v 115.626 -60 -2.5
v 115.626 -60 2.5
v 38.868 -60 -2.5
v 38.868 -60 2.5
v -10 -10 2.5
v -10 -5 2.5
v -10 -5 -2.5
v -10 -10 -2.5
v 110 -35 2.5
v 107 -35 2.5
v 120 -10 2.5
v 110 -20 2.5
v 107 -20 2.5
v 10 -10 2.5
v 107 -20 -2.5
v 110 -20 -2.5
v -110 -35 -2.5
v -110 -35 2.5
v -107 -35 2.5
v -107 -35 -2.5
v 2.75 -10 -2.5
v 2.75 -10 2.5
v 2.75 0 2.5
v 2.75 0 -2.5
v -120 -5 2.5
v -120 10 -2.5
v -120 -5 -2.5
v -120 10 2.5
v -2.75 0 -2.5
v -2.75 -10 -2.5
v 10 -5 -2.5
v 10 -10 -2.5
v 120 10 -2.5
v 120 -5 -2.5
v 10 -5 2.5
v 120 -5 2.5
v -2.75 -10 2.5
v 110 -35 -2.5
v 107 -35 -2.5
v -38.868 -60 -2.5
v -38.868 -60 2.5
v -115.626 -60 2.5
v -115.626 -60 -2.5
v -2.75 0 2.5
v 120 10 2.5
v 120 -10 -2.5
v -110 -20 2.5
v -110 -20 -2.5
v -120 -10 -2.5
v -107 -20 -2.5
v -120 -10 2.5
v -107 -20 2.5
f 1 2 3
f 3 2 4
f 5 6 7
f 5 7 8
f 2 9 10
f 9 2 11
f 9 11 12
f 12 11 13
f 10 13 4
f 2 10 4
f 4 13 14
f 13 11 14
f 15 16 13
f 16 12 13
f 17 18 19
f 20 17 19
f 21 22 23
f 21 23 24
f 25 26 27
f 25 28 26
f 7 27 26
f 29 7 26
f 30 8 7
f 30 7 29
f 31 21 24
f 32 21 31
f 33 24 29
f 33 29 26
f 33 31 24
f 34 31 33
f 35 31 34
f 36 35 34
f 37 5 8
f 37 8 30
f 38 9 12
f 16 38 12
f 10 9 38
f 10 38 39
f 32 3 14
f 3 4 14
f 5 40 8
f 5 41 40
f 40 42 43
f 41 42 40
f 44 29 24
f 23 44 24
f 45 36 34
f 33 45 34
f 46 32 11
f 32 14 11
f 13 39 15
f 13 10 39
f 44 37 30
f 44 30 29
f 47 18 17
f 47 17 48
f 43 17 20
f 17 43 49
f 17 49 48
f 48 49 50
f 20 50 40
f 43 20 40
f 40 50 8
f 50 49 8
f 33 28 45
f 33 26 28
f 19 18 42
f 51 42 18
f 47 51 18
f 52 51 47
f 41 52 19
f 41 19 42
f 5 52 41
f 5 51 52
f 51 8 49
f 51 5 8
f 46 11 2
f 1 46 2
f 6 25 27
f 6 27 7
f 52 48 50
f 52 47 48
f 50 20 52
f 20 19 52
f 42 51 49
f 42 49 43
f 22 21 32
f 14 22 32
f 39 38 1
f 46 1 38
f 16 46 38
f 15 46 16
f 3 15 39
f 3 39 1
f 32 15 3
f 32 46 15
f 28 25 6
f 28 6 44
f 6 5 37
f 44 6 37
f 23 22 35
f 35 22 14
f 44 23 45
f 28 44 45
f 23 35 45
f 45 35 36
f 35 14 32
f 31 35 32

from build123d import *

# Parameters (mm, degrees)
SKETCH1_W             = 3
SKETCH1_H             = 15
BOSS_EXTRUDE2_DEPTH   = 2.5
BOSS_EXTRUDE2_2_DEPTH = 2.5
MIRROR1_START         = -5
MIRROR1_OUTLINE_W     = 117.25
MIRROR1_OUTLINE_H     = 5
MIRROR1_DEPTH         = 15
MIRROR1_START_2       = -10
MIRROR1_2_OUTLINE_W   = 7.25
MIRROR1_2_OUTLINE_H   = 5
MIRROR1_2_DEPTH       = 5
MIRROR1_3_OUTLINE_W   = 2.75
MIRROR1_3_OUTLINE_H   = 5
MIRROR1_3_DEPTH       = 10


# Read off the part's stored shape, not the designer's step: Mirror1
with BuildPart() as part:
    # Sketch1 → Boss-Extrude2 (new, symmetric)
    with BuildSketch(Plane.XY):
        Polygon((-10, -10), (-120, -10), (-115.625566824, -60), (-38.867513459, -60), align=None)
        with Locations((-108.5, -27.5)):
            Rectangle(SKETCH1_W, SKETCH1_H, mode=Mode.SUBTRACT)
    extrude(amount=BOSS_EXTRUDE2_DEPTH, both=True)


with BuildPart() as body_2:
    # Sketch1 → Boss-Extrude2 2 (new, symmetric)
    with BuildSketch(Plane.XY):
        Polygon((-120, 10), (-120, -5), (-10, -5), (-10, -10), (-2.75, -10), (-2.75, 0), (0, 0), (0, 10), align=None)
    extrude(amount=BOSS_EXTRUDE2_2_DEPTH, both=True)



with BuildPart() as body_3:
    # Mirror1 outline → Mirror1 (new body)
    with BuildSketch(Plane(origin=(0, 0, 0), x_dir=(1, 0, 0), z_dir=(0, 1, 0)).offset(MIRROR1_START)):
        with Locations((61.375, 0)):
            Rectangle(MIRROR1_OUTLINE_W, MIRROR1_OUTLINE_H)
    extrude(amount=MIRROR1_DEPTH)

    # Mirror1 2 outline → Mirror1 2 (add)
    with BuildSketch(Plane(origin=(0, 0, 0), x_dir=(1, 0, 0), z_dir=(0, 1, 0)).offset(MIRROR1_START_2)):
        with Locations((6.375, 0)):
            Rectangle(MIRROR1_2_OUTLINE_W, MIRROR1_2_OUTLINE_H)
    extrude(amount=MIRROR1_2_DEPTH)


with BuildPart() as body_2_1:
    add(body_2.part)

    add(body_3.part)  # Mirror1 3 merges body 3
    # Mirror1 3 outline → Mirror1 3 (add)
    with BuildSketch(Plane(origin=(0, 0, 0), x_dir=(1, 0, 0), z_dir=(0, 1, 0))):
        with Locations((1.375, 0)):
            Rectangle(MIRROR1_3_OUTLINE_W, MIRROR1_3_OUTLINE_H)
    extrude(amount=MIRROR1_3_DEPTH)


with BuildPart() as body_3_2:
    # Mirror2: mirrored copy
    add(part.part.mirror(Plane(origin=(0, 0, 0), x_dir=(0, 0, 1), z_dir=(1, 0, 0))))


solid = Compound([part.part, body_2_1.part, body_3_2.part])
